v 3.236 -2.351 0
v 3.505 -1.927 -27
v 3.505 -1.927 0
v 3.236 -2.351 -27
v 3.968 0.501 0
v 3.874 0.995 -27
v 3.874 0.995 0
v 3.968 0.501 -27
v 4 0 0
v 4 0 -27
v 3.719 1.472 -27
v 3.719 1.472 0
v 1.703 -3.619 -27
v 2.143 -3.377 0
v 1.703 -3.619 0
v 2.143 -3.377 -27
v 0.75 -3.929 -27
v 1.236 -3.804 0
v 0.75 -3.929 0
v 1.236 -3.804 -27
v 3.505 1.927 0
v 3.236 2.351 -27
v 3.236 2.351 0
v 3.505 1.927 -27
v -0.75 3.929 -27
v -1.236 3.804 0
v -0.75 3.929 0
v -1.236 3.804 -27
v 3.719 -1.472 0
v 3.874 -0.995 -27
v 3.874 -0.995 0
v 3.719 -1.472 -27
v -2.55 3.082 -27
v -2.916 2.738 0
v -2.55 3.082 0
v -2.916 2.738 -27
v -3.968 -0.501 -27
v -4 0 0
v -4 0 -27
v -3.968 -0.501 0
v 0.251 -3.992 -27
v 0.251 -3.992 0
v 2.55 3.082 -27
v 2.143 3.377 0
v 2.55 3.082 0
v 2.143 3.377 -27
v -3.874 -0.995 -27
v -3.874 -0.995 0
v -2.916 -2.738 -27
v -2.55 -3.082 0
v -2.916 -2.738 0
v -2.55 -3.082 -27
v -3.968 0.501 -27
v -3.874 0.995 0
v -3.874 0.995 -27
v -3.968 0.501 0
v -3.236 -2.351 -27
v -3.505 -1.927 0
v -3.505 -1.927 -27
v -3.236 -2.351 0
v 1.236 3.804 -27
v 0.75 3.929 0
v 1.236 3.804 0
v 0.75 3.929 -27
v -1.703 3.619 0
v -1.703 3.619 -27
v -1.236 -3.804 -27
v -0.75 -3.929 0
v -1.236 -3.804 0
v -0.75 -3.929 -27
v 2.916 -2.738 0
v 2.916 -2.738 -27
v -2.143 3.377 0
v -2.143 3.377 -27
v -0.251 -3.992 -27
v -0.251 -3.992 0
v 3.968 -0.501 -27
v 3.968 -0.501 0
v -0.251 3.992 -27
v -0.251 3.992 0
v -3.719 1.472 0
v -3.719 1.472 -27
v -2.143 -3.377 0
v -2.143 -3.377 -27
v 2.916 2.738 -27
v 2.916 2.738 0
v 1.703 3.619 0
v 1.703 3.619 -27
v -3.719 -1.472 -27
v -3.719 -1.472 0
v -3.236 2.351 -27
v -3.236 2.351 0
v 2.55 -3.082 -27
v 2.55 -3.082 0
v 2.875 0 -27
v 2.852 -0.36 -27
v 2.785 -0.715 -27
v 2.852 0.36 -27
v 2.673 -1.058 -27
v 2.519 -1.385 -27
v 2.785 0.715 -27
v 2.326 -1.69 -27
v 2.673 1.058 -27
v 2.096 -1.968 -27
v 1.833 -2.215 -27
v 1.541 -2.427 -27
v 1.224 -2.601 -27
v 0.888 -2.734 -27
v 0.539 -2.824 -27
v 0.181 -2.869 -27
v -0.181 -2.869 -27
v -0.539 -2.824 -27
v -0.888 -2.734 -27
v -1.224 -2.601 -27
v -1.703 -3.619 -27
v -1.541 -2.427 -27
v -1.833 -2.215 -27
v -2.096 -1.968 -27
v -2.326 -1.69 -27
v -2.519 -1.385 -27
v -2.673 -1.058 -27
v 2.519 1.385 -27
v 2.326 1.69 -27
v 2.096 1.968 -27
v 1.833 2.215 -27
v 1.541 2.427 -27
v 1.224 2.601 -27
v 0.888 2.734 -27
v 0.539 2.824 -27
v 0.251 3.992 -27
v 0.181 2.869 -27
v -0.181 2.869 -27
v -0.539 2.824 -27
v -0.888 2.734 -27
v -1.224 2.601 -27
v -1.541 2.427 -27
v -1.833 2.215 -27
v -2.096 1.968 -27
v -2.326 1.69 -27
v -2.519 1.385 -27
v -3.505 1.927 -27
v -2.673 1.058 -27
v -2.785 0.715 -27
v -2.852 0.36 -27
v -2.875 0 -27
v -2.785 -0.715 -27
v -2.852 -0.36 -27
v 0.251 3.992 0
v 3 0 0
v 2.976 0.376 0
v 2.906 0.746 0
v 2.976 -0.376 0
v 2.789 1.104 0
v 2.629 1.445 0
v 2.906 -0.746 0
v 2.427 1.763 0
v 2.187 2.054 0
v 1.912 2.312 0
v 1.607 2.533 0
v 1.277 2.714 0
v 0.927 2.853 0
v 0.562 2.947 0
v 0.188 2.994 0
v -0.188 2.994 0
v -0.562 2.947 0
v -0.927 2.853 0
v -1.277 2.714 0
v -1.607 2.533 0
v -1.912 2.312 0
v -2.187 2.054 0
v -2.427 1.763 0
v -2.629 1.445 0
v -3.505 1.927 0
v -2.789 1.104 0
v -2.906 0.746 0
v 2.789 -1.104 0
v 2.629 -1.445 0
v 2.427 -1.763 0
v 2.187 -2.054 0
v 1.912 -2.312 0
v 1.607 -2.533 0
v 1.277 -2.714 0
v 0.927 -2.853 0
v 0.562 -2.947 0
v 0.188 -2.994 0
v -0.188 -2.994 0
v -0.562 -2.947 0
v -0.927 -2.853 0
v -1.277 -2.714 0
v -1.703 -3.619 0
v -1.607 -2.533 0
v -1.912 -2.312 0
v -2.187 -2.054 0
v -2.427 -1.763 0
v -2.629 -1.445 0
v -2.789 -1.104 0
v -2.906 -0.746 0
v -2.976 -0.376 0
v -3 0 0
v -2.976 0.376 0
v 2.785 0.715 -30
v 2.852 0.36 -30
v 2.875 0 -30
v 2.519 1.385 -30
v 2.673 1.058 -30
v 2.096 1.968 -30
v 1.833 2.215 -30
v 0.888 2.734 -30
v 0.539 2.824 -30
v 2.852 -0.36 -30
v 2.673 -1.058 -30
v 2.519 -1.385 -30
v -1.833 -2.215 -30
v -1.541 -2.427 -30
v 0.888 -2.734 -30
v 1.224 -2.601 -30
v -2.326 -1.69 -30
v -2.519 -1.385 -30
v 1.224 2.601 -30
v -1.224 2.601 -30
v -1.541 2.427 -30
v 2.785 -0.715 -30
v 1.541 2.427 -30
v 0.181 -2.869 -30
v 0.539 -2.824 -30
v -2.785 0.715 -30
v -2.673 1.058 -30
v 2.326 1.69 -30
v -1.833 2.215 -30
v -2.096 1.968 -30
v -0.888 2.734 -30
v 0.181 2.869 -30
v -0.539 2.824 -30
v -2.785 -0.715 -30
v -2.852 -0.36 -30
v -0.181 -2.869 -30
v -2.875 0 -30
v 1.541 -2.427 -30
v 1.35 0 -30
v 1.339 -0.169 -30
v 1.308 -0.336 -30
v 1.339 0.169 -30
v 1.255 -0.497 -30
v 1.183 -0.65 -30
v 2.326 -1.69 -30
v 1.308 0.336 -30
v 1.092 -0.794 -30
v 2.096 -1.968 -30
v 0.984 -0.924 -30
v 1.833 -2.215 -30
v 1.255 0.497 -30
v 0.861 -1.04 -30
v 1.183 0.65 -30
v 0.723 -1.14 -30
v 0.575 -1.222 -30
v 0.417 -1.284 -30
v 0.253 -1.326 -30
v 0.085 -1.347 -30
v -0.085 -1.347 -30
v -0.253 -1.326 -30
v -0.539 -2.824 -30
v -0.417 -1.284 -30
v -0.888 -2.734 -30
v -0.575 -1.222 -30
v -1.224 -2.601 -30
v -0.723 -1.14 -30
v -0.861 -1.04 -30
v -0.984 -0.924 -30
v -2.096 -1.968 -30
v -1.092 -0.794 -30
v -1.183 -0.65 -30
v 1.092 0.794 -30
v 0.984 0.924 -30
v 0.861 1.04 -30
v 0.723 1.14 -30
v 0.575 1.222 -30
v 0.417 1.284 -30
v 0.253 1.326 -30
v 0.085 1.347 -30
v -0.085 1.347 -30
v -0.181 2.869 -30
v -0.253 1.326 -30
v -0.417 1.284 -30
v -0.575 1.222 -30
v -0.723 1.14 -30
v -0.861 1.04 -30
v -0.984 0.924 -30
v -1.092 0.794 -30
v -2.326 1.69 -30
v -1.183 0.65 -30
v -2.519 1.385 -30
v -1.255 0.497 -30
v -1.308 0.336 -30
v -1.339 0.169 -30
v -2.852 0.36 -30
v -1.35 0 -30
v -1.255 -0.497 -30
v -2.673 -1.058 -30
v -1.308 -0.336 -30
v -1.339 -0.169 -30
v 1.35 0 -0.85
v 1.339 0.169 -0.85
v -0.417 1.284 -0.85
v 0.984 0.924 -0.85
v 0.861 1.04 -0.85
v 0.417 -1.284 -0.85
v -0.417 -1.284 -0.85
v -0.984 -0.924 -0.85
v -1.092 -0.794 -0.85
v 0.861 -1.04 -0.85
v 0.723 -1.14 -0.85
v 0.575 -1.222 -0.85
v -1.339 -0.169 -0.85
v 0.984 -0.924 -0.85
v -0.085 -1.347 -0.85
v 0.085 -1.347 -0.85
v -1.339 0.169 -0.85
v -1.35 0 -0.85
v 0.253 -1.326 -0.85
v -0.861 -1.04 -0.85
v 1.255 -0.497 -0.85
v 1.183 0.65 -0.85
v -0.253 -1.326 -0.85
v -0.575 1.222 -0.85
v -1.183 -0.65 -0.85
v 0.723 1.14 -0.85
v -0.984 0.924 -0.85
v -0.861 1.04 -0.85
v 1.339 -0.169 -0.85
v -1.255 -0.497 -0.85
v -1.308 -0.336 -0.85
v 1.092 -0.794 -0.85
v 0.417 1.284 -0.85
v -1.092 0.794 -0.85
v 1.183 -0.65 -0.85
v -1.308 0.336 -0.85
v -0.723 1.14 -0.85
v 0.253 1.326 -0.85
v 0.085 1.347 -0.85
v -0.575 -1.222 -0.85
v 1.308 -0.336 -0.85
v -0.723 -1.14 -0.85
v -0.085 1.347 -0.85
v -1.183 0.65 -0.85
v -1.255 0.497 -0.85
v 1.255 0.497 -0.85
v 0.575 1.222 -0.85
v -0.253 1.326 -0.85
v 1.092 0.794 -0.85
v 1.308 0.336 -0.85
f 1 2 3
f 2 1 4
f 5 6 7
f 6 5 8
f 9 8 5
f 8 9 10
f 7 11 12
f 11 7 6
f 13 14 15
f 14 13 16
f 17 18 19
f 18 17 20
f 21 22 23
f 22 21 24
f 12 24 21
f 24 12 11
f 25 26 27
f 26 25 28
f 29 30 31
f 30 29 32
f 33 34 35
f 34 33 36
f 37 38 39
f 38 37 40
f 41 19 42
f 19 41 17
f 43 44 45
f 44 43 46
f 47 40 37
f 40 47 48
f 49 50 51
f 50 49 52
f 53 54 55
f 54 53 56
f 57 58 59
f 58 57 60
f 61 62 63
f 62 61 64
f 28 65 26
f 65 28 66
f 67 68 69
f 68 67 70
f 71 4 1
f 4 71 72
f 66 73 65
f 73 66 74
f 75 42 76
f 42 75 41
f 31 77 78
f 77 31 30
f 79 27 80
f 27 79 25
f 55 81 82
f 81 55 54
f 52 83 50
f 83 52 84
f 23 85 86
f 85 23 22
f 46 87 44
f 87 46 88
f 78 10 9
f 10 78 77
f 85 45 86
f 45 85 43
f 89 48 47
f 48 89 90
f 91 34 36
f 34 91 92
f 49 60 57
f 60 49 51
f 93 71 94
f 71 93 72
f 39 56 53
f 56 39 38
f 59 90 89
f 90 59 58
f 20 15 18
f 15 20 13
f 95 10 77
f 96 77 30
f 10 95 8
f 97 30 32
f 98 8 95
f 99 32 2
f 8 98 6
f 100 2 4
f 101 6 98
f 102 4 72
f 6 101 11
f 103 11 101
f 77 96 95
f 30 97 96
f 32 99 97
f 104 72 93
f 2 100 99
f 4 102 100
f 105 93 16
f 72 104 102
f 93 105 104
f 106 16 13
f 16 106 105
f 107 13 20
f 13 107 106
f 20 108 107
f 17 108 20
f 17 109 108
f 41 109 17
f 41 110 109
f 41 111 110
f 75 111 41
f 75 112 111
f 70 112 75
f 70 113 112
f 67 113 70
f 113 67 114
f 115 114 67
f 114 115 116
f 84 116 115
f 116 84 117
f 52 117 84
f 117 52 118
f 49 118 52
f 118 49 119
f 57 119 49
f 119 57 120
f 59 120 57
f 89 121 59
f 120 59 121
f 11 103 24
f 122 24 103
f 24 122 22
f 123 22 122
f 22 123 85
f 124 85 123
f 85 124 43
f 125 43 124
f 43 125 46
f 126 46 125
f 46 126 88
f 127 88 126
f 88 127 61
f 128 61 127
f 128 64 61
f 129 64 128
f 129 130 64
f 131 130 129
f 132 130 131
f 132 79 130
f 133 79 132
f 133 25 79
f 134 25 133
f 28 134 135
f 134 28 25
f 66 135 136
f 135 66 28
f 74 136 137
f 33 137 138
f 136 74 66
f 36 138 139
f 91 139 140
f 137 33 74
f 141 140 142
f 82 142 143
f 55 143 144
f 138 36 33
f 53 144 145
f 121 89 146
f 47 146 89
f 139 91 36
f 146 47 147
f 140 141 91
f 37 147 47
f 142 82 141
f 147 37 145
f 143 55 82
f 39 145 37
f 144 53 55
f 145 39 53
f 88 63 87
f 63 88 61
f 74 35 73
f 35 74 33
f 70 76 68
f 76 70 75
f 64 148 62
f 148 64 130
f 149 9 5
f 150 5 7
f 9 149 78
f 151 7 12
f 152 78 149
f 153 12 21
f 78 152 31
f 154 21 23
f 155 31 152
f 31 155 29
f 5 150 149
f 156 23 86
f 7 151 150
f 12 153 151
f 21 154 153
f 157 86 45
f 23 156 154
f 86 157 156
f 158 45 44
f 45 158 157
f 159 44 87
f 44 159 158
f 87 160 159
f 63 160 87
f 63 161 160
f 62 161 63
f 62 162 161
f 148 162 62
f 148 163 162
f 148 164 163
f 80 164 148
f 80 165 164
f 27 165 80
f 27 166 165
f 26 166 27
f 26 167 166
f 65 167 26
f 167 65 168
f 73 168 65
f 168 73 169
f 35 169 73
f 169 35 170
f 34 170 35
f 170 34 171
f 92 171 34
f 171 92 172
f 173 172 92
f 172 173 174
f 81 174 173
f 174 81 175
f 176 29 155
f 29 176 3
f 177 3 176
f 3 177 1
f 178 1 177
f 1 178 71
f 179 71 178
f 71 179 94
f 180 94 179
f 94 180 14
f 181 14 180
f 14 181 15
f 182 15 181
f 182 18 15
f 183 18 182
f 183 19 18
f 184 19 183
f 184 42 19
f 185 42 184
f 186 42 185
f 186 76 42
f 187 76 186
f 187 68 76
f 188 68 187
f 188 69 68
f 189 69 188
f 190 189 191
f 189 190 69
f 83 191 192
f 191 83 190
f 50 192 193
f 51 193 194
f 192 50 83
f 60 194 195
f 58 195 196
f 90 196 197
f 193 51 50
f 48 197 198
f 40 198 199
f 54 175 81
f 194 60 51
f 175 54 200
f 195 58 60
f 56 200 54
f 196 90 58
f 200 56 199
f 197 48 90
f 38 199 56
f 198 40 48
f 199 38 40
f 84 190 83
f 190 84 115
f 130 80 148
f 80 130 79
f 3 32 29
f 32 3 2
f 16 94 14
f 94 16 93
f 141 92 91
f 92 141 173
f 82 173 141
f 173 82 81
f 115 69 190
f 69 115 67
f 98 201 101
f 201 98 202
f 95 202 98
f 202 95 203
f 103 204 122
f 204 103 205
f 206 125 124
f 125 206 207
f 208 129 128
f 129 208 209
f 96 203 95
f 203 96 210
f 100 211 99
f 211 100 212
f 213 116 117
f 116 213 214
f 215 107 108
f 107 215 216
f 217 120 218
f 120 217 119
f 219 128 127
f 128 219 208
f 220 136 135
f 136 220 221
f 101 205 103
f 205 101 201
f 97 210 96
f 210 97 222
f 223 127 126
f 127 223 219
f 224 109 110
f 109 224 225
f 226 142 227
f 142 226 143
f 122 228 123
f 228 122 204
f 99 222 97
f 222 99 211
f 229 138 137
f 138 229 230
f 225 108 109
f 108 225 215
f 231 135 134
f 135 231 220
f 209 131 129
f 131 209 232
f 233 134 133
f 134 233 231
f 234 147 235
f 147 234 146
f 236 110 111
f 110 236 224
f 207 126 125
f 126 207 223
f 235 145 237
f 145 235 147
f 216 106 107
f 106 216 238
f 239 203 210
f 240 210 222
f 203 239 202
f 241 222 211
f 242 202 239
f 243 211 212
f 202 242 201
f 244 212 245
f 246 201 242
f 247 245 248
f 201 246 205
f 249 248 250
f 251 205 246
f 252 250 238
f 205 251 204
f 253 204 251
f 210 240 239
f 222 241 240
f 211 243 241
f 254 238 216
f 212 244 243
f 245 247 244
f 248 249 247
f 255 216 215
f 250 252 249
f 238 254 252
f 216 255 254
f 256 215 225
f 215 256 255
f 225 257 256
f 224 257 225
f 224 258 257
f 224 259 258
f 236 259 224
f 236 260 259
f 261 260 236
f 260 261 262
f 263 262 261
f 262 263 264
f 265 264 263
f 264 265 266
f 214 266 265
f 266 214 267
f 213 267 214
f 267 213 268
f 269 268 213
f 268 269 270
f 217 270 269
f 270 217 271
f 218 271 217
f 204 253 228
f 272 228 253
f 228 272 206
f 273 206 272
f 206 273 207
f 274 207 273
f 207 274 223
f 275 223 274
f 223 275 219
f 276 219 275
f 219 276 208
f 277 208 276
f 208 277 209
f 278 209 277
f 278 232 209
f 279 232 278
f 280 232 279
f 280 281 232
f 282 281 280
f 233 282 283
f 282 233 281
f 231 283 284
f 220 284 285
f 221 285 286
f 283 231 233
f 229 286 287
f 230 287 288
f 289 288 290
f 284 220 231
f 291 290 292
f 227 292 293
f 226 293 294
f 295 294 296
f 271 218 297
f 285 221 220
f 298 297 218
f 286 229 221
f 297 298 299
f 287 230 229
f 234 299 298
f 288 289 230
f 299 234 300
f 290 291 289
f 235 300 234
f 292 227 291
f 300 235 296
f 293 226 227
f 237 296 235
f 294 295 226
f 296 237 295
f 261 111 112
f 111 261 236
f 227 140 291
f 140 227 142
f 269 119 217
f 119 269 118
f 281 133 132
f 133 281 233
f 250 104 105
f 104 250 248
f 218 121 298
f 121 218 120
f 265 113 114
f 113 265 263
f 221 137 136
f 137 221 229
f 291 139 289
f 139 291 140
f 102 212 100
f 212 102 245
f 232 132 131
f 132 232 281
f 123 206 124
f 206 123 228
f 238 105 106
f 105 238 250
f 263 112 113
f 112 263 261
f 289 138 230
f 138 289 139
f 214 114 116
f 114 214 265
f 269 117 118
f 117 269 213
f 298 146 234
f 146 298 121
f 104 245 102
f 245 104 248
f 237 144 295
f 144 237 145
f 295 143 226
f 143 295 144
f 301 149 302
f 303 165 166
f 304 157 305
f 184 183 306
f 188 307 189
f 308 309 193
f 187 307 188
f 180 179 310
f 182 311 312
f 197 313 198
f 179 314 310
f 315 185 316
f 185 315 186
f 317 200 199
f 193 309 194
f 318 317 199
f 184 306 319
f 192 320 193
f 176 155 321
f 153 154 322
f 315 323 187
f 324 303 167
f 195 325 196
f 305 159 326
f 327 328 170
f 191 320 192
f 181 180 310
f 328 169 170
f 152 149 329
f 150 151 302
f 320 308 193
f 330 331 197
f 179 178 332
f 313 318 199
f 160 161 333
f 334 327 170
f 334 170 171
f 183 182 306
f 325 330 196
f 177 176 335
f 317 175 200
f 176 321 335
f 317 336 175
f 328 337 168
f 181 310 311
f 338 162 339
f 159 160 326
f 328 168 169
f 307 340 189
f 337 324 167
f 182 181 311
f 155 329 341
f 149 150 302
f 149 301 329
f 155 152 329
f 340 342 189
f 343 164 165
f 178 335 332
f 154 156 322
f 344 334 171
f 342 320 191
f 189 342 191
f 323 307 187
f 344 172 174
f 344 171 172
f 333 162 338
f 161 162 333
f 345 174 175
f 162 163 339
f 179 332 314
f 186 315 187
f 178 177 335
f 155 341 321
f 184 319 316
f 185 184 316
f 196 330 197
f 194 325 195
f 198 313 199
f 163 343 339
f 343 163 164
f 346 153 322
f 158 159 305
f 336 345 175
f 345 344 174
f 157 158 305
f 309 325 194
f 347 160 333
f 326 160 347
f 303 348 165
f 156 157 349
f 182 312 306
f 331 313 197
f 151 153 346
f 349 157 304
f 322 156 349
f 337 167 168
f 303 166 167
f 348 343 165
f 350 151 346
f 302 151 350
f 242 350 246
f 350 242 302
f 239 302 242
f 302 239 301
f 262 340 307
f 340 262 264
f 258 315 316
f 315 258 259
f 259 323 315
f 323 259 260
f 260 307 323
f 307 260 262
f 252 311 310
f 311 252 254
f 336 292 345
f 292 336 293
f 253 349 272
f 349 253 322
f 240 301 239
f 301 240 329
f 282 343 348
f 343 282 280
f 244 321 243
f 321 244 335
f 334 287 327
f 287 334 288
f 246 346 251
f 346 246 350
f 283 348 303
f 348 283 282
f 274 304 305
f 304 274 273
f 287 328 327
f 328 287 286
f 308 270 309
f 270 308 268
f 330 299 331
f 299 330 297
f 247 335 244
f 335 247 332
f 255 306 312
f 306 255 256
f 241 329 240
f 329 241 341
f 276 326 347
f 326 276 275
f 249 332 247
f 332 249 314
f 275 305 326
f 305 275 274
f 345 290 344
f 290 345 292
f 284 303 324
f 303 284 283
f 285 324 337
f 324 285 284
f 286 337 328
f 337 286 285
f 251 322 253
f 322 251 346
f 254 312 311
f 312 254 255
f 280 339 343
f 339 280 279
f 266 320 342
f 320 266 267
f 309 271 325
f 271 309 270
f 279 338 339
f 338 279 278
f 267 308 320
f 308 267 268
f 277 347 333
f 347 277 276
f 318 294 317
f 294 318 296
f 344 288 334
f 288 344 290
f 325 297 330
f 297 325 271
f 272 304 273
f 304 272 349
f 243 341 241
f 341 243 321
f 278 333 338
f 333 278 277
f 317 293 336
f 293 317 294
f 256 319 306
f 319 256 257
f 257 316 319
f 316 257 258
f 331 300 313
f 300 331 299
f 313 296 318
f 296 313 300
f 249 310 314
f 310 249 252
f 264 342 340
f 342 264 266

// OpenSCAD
$fn = 50;

difference() {
	union() {
		translate(v = [0, 0, -27.0]) {
			cylinder(h = 27, r = 4.0);
		}
		#translate(v = [0, 0, -30.0]) {
			cylinder(h = 30, r = 2.875);
		}
	}
	union() {
		translate(v = [0, 0, 0]) {
			rotate(a = [0, 0, 0]) {
				difference() {
					union() {
						translate(v = [0, 0, -30.0]) {
							cylinder(h = 30, r = 1.0);
						}
						translate(v = [0, 0, -0.85]) {
							cylinder(h = 0.85, r1 = 1.35, r2 = 3.0);
						}
						translate(v = [0, 0, -30.0]) {
							cylinder(h = 30, r = 1.35);
						}
						translate(v = [0, 0, -30.0]) {
							cylinder(h = 30, r = 1.0);
						}
					}
					union();
				}
			}
		}
	}
}
